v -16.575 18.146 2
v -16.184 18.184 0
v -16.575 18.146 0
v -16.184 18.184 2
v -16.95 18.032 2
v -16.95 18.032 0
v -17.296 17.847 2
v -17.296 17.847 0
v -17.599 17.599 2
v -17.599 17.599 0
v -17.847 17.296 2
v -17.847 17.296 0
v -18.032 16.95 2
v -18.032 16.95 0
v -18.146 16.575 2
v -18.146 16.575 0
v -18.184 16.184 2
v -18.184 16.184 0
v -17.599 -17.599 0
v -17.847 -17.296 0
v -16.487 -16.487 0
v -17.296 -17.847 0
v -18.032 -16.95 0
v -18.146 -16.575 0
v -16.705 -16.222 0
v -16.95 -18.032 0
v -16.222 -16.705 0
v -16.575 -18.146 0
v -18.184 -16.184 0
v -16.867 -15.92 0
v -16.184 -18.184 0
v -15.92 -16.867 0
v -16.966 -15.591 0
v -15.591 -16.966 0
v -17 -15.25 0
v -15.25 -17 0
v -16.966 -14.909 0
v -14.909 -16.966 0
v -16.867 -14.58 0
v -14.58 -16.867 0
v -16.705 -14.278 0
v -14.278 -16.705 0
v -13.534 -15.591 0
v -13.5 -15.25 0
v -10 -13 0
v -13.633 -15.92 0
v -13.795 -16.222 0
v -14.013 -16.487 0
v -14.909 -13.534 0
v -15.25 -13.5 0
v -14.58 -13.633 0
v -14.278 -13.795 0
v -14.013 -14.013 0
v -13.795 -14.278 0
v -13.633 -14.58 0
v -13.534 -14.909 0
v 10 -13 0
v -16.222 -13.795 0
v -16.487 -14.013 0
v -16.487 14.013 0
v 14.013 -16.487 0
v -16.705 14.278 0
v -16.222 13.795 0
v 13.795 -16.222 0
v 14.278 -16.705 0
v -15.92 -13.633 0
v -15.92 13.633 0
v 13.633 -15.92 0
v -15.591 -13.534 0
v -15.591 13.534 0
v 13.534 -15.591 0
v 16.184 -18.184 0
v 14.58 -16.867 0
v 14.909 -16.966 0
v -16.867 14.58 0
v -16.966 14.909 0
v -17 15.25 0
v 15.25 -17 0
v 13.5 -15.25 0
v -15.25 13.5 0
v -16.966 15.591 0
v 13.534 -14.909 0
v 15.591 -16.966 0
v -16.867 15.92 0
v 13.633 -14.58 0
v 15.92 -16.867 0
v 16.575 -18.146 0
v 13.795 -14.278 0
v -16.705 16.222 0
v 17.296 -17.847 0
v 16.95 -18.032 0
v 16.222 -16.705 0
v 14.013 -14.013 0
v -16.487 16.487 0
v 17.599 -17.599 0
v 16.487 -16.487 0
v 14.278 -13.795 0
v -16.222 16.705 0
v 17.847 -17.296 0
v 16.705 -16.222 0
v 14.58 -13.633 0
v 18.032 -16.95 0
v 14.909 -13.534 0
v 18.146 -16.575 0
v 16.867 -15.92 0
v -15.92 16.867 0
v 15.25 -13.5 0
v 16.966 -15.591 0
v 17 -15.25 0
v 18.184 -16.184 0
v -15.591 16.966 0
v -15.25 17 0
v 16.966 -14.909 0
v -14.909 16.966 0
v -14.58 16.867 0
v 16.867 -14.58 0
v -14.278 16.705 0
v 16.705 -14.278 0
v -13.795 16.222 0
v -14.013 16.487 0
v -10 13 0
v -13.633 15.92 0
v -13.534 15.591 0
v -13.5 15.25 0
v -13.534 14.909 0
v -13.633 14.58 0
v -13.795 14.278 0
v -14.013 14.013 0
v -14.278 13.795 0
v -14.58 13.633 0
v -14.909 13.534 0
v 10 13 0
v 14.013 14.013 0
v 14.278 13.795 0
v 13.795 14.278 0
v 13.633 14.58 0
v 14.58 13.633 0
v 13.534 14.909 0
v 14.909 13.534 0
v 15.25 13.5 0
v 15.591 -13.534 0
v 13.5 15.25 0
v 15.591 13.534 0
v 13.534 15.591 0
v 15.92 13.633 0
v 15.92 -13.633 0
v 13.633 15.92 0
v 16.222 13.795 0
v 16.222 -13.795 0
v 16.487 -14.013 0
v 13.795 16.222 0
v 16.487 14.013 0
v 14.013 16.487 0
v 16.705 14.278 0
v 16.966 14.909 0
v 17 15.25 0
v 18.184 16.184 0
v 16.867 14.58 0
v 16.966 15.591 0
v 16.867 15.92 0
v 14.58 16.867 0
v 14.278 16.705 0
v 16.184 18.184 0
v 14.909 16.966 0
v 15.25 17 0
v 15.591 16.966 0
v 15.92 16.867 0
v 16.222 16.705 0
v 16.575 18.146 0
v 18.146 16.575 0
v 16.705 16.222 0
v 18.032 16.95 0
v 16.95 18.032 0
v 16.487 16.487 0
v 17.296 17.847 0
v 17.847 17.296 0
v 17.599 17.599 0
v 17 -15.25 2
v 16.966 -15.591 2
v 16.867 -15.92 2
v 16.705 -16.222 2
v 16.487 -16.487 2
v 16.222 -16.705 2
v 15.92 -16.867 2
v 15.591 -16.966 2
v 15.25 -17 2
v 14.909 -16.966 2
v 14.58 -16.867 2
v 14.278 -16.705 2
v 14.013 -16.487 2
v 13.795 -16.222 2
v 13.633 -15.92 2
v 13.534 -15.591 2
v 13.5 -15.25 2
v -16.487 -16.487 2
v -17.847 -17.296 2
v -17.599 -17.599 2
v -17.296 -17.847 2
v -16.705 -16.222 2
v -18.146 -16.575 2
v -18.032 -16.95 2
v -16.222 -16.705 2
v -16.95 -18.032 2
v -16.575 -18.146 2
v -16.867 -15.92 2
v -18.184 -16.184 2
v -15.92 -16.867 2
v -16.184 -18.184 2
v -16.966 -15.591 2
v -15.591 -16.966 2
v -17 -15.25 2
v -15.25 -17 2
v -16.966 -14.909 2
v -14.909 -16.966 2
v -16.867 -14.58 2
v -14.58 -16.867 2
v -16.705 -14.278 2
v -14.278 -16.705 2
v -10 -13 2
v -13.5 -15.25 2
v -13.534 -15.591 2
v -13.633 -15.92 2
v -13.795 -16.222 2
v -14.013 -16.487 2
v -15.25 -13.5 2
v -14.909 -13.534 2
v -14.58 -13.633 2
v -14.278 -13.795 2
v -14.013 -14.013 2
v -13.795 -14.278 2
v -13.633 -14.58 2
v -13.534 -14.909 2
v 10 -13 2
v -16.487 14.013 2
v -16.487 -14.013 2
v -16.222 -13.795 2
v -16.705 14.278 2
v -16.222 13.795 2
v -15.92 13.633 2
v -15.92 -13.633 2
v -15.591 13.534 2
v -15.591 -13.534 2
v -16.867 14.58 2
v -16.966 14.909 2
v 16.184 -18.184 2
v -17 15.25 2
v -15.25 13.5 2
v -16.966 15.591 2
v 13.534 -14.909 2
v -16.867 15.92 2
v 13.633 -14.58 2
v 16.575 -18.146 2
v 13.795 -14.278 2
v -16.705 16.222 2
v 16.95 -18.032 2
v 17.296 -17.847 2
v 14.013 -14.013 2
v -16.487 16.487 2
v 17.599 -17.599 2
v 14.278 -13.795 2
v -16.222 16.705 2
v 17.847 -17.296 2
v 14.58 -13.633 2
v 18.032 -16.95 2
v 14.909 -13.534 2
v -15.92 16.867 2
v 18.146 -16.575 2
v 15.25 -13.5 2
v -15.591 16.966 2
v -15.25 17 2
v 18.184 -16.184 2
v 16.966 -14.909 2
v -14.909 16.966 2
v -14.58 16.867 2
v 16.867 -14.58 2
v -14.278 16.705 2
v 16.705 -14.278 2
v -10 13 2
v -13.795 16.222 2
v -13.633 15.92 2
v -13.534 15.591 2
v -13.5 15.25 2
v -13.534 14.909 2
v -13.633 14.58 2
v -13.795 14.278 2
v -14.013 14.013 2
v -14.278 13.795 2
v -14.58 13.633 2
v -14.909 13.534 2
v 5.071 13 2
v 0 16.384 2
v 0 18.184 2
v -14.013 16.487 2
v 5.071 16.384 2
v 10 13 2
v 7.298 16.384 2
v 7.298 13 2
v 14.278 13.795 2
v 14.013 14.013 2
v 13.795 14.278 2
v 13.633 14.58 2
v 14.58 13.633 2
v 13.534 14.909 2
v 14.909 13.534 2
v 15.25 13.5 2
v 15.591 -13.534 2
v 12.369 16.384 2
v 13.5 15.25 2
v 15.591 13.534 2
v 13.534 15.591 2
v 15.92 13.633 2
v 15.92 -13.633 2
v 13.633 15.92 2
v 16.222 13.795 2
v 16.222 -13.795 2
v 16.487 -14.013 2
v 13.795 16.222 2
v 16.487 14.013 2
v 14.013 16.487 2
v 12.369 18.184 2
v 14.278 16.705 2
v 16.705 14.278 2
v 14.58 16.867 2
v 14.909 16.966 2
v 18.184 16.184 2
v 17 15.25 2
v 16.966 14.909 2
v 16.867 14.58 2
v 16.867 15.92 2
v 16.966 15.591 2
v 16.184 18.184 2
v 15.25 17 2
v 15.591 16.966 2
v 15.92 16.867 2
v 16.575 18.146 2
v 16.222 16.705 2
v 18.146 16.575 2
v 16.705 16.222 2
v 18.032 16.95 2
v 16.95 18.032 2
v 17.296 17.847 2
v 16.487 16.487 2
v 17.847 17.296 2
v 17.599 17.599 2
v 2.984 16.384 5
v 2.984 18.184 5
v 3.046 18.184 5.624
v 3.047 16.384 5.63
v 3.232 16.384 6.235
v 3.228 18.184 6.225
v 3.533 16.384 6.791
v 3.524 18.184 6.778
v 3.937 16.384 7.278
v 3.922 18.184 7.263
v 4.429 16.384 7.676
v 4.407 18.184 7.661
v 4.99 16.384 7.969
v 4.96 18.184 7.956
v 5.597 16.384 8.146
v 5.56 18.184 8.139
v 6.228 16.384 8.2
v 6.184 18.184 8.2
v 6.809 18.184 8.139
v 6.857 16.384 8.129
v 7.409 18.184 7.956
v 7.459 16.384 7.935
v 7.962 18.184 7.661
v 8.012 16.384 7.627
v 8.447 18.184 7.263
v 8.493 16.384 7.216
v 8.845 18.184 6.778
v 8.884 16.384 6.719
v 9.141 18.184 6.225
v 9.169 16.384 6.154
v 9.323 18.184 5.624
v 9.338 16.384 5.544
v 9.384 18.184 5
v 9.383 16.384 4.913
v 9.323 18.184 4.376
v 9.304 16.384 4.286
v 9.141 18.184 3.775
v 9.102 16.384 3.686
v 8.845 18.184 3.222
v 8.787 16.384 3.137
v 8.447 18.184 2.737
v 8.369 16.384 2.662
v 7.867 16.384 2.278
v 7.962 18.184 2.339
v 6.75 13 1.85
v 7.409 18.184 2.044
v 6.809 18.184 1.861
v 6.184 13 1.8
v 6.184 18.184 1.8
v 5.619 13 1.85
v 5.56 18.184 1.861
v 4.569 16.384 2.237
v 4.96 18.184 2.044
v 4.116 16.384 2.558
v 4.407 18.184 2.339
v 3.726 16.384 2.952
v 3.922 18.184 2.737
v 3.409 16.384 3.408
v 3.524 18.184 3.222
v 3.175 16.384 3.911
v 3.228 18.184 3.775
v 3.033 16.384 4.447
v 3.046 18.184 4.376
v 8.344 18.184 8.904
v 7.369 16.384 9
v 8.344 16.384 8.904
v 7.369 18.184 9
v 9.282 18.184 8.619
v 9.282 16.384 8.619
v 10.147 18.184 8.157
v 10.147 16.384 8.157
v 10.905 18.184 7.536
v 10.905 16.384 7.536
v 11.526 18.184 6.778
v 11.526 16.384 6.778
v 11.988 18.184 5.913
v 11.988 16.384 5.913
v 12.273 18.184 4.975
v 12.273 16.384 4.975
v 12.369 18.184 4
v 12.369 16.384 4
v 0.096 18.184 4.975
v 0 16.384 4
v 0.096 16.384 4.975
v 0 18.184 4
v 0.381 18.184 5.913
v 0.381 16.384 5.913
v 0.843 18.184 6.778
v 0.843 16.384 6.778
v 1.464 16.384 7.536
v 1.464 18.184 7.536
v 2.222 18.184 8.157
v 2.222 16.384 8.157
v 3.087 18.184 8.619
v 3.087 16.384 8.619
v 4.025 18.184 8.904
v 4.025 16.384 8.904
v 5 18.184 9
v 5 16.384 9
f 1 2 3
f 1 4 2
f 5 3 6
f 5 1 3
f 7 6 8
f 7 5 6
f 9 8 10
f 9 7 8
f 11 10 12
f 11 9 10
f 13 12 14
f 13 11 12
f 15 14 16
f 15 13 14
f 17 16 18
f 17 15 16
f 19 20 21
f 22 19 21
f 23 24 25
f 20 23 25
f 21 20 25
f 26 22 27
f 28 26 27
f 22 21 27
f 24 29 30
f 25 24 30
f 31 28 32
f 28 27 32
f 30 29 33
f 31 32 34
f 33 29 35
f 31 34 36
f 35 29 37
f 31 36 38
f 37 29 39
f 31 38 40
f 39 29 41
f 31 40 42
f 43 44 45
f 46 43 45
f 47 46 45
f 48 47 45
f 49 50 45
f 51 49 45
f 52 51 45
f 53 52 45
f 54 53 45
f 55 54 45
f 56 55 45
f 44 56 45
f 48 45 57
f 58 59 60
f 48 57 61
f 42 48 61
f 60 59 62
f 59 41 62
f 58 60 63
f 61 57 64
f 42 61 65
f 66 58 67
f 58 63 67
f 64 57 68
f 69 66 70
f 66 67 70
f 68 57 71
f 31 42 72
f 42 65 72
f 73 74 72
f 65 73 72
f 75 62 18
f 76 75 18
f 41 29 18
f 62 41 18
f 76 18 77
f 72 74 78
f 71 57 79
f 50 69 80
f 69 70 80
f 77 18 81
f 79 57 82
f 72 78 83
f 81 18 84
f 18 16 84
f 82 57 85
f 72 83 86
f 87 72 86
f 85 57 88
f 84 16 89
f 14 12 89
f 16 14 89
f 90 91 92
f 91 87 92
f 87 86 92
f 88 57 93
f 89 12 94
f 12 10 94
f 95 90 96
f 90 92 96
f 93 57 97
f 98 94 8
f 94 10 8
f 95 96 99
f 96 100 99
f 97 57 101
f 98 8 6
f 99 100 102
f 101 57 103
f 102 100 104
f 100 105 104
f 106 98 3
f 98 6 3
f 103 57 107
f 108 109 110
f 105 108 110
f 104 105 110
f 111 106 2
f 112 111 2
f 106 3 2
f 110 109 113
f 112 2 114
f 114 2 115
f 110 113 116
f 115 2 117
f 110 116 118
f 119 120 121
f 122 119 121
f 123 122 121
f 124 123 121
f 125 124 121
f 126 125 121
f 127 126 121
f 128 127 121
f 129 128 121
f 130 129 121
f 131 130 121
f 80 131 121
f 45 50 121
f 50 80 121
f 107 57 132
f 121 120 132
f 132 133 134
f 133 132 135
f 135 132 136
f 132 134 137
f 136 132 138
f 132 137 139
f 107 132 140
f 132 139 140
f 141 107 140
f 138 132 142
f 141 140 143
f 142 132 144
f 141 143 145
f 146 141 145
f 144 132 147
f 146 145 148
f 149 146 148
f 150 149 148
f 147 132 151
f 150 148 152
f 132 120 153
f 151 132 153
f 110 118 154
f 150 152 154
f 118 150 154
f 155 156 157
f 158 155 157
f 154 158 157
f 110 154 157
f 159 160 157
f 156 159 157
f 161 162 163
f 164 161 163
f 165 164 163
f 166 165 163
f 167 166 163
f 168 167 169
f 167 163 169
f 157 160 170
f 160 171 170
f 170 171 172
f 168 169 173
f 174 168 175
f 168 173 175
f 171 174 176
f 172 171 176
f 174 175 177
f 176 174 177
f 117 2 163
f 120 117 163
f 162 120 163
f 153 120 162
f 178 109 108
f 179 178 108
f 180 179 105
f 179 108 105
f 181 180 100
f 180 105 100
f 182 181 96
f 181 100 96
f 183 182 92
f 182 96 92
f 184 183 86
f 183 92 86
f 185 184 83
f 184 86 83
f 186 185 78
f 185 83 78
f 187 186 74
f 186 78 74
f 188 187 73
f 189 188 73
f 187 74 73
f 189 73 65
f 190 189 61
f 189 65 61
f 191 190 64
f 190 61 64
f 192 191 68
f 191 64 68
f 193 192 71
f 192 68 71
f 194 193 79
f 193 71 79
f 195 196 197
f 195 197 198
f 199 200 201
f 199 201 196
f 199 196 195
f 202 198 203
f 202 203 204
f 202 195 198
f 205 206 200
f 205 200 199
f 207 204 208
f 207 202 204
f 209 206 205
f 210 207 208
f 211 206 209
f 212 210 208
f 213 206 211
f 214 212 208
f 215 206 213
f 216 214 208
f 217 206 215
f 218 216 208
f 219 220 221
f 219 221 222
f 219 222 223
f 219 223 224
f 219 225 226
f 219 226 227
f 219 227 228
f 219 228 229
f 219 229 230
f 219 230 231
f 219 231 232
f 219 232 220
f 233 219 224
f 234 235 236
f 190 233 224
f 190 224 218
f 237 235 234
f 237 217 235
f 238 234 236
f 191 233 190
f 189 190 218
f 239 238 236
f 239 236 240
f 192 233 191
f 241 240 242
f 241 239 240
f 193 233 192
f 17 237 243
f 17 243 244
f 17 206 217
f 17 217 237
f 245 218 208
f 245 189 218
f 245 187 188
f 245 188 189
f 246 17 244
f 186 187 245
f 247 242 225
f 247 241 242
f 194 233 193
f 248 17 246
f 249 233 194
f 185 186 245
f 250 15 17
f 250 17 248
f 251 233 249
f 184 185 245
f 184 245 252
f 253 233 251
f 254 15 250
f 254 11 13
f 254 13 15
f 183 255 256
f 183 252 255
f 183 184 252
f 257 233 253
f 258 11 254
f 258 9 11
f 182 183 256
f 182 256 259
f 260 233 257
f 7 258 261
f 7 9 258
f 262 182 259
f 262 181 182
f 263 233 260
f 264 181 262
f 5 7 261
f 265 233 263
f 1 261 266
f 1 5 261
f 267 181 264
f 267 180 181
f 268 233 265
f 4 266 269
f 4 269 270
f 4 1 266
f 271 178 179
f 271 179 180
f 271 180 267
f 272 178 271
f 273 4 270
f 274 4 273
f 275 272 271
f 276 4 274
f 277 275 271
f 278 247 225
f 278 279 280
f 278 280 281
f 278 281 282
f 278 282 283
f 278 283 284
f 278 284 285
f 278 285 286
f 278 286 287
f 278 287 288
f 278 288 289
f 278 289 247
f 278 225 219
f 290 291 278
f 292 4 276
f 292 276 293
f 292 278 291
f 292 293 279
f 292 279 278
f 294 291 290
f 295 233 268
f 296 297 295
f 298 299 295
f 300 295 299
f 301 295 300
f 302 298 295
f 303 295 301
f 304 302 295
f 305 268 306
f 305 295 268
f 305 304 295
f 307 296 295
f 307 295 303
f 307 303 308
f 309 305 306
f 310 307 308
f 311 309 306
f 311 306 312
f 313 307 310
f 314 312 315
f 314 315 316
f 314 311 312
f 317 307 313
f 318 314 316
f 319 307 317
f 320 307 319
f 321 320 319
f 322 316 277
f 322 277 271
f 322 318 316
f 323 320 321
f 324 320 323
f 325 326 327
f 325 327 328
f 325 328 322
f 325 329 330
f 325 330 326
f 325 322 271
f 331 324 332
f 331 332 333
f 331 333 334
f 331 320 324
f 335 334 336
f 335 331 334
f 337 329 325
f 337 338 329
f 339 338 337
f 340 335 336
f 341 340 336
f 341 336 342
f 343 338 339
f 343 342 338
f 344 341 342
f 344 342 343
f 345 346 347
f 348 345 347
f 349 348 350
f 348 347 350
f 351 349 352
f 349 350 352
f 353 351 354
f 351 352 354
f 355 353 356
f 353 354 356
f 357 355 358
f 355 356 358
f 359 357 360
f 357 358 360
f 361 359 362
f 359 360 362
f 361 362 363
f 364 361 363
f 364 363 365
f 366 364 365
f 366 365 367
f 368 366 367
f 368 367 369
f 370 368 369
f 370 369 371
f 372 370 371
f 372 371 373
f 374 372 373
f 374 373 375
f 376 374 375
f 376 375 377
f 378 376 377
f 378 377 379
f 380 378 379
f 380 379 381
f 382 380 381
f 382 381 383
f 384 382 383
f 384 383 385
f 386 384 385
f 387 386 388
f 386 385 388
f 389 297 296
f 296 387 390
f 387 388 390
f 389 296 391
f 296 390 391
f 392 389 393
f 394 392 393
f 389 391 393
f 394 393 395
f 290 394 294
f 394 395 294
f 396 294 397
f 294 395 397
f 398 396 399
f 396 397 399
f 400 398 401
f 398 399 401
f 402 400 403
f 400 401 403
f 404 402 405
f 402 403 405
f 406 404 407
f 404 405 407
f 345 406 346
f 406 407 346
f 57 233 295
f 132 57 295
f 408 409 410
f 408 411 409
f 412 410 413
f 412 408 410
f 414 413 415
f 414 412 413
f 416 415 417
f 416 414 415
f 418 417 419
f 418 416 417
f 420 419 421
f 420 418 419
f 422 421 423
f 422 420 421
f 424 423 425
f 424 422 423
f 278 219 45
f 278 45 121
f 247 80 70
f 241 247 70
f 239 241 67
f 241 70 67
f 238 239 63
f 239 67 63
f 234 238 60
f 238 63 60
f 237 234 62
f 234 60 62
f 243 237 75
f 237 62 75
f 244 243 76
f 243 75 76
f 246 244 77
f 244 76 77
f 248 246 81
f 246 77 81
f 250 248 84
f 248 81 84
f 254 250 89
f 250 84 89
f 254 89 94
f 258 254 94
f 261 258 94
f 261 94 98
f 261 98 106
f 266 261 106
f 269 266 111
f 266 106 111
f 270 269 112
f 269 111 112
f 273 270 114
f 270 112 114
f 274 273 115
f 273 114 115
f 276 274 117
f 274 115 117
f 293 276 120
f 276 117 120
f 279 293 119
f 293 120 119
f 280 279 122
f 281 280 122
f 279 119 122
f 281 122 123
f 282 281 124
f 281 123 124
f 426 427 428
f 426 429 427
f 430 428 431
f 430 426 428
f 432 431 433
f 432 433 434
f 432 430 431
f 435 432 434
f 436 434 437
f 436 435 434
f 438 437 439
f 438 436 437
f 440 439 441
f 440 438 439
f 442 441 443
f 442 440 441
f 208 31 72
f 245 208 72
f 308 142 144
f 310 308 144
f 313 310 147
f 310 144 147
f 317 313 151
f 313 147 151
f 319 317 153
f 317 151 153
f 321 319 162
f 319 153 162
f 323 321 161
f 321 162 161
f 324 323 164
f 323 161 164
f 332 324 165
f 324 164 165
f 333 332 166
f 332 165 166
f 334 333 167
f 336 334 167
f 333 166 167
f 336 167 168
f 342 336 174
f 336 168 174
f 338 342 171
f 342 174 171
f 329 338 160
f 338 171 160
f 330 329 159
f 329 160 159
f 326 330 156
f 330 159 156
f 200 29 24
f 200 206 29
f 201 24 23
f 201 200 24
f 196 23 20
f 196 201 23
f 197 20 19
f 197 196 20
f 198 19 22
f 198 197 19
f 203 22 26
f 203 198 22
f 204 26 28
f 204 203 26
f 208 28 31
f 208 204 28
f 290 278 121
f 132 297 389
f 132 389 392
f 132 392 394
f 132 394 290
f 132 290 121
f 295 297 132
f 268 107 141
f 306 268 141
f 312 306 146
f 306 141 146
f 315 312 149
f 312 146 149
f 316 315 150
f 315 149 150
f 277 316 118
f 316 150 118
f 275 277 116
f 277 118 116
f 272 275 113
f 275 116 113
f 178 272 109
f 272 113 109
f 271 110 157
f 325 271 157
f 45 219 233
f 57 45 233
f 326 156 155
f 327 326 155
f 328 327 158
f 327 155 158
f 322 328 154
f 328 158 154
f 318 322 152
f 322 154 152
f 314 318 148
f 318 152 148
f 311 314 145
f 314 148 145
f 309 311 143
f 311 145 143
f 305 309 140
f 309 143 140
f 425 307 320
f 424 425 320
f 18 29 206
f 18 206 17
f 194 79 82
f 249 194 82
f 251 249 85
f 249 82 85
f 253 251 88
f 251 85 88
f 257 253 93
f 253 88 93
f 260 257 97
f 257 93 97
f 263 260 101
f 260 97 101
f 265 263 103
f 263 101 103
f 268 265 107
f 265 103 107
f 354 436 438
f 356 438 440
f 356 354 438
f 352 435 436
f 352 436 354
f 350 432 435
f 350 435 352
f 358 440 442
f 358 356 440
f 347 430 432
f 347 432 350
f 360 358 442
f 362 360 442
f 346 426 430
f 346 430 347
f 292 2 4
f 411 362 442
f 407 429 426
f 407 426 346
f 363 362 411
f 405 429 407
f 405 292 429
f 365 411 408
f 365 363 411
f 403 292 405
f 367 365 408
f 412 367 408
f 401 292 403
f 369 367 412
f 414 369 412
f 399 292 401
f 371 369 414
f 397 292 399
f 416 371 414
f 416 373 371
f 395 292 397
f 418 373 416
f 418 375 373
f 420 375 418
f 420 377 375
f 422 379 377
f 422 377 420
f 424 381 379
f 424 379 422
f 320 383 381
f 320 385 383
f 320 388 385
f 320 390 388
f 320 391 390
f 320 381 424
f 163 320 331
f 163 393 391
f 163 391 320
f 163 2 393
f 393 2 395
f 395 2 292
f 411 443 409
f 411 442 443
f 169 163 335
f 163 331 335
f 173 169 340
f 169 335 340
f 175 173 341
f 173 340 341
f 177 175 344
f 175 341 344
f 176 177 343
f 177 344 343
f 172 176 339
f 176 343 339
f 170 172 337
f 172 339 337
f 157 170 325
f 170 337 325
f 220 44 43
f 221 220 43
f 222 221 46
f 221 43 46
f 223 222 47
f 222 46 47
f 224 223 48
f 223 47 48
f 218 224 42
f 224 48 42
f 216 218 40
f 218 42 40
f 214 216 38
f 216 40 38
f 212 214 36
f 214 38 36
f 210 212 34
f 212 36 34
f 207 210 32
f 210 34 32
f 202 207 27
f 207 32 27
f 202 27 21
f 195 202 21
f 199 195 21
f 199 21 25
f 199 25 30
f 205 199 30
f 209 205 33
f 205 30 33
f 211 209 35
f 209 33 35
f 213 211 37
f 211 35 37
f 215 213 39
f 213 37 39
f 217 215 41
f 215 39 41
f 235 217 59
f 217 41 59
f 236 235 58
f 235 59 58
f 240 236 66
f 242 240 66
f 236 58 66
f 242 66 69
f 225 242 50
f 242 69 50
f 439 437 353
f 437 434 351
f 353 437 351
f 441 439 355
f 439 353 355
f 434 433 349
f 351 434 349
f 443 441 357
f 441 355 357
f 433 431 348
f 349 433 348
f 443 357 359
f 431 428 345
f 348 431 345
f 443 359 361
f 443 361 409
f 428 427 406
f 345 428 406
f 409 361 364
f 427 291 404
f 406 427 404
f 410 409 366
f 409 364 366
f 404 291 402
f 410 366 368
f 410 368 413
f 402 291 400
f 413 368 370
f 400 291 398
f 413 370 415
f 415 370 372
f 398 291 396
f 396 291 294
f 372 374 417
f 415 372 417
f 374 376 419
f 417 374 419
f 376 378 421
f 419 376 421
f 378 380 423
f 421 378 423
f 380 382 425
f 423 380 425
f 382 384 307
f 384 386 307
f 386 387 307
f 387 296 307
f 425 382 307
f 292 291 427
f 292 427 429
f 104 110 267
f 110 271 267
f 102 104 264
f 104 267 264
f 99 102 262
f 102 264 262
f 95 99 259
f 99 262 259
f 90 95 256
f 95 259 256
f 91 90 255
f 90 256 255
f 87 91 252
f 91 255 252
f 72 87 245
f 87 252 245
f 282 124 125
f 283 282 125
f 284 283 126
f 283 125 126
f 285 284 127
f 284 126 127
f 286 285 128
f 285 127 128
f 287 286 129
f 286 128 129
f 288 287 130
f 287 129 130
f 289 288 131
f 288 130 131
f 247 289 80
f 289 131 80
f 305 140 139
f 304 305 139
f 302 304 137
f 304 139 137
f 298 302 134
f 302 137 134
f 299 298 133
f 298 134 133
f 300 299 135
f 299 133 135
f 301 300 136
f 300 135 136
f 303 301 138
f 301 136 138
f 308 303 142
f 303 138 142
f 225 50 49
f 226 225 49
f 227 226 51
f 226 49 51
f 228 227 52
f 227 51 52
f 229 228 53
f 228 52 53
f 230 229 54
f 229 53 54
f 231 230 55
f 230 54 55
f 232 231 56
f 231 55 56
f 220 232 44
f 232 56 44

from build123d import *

# Parameters (mm, degrees)
F0_W     = 36.3689862838
F0_H     = 36.3689862838
F1_DEPTH = 2
F2_W     = 20
F2_H     = 26
F3_DEPTH = 25
F4_W     = 6
F4_H     = 1.8
F4_W_2   = 3.1844931419
F5_DEPTH = 7
F6_R     = 3.2
F7_DEPTH = 25
F8_R     = 5
F9_R     = 2


with BuildPart() as f1:
    # F0 (on Top) → F1 (new body)
    with BuildSketch(Plane.XY):
        Rectangle(F0_W, F0_H)
        with BuildLine():
            ThreePointArc((-15.25, 13.5), (-16.4874368671, 16.4874368671), (-13.5, 15.25))
            Line((-13.5, 15.25), (13.5, 15.25))
            ThreePointArc((13.5, 15.25), (15.25, 17), (17, 15.25))
            ThreePointArc((17, 15.25), (16.4874368671, 14.0125631329), (15.25, 13.5))
            Line((15.25, 13.5), (15.25, -13.5))
            ThreePointArc((15.25, -13.5), (16.4874368671, -14.0125631329), (17, -15.25))
            ThreePointArc((17, -15.25), (15.25, -17), (13.5, -15.25))
            Line((13.5, -15.25), (-13.5, -15.25))
            ThreePointArc((-13.5, -15.25), (-16.4874368671, -16.4874368671), (-15.25, -13.5))
            Line((-15.25, -13.5), (-15.25, 13.5))
        make_face(mode=Mode.SUBTRACT)
        with BuildLine():
            Line((13.5, 15.25), (-13.5, 15.25))
            ThreePointArc((-13.5, 15.25), (-14.0125631329, 14.0125631329), (-15.25, 13.5))
            Line((-15.25, 13.5), (-15.25, -13.5))
            ThreePointArc((-15.25, -13.5), (-14.0125631329, -14.0125631329), (-13.5, -15.25))
            Line((-13.5, -15.25), (13.5, -15.25))
            ThreePointArc((13.5, -15.25), (14.0125631329, -14.0125631329), (15.25, -13.5))
            Line((15.25, -13.5), (15.25, 13.5))
            ThreePointArc((15.25, 13.5), (14.0125631329, 14.0125631329), (13.5, 15.25))
        make_face()
    extrude(amount=F1_DEPTH)

    # F2 (on face) → F3 (cut)
    with BuildSketch(Plane.XY.offset(2)):
        Rectangle(F2_W, F2_H)
    extrude(amount=-F3_DEPTH, mode=Mode.SUBTRACT)

    # F4 (on face) → F5 (join)
    with BuildSketch(Plane.XY.offset(2)):
        with Locations((6.1844931419, 17.2844931419)):
            Rectangle(F4_W, F4_H)
        with Locations((1.592246571, 17.2844931419)):
            Rectangle(F4_W_2, F4_H)
        with Locations((10.7767397129, 17.2844931419)):
            Rectangle(F4_W_2, F4_H)
    extrude(amount=F5_DEPTH)

    # F6 (on face) → F7 (cut)
    with BuildSketch(Plane(origin=(0, 18.1844931419, 0), x_dir=(-1, 0, 0), z_dir=(0, 1, 0))):
        with Locations((-6.1844931419, 5)):
            Circle(F6_R)
    extrude(amount=-F7_DEPTH, mode=Mode.SUBTRACT)

    # F8
    f8_edges = [f1.edges().sort_by_distance(p)[0] for p in [
        (12.368986, 17.284493, 9),
        (0, 17.284493, 9),
    ]]
    fillet(f8_edges, radius=F8_R)

    # F9
    f9_edges = [f1.edges().sort_by_distance(p)[0] for p in [
        (-18.184493, 18.184493, 1),
        (-18.184493, -18.184493, 1),
        (18.184493, 18.184493, 1),
        (18.184493, -18.184493, 1),
    ]]
    fillet(f9_edges, radius=F9_R)


solid = f1.part
